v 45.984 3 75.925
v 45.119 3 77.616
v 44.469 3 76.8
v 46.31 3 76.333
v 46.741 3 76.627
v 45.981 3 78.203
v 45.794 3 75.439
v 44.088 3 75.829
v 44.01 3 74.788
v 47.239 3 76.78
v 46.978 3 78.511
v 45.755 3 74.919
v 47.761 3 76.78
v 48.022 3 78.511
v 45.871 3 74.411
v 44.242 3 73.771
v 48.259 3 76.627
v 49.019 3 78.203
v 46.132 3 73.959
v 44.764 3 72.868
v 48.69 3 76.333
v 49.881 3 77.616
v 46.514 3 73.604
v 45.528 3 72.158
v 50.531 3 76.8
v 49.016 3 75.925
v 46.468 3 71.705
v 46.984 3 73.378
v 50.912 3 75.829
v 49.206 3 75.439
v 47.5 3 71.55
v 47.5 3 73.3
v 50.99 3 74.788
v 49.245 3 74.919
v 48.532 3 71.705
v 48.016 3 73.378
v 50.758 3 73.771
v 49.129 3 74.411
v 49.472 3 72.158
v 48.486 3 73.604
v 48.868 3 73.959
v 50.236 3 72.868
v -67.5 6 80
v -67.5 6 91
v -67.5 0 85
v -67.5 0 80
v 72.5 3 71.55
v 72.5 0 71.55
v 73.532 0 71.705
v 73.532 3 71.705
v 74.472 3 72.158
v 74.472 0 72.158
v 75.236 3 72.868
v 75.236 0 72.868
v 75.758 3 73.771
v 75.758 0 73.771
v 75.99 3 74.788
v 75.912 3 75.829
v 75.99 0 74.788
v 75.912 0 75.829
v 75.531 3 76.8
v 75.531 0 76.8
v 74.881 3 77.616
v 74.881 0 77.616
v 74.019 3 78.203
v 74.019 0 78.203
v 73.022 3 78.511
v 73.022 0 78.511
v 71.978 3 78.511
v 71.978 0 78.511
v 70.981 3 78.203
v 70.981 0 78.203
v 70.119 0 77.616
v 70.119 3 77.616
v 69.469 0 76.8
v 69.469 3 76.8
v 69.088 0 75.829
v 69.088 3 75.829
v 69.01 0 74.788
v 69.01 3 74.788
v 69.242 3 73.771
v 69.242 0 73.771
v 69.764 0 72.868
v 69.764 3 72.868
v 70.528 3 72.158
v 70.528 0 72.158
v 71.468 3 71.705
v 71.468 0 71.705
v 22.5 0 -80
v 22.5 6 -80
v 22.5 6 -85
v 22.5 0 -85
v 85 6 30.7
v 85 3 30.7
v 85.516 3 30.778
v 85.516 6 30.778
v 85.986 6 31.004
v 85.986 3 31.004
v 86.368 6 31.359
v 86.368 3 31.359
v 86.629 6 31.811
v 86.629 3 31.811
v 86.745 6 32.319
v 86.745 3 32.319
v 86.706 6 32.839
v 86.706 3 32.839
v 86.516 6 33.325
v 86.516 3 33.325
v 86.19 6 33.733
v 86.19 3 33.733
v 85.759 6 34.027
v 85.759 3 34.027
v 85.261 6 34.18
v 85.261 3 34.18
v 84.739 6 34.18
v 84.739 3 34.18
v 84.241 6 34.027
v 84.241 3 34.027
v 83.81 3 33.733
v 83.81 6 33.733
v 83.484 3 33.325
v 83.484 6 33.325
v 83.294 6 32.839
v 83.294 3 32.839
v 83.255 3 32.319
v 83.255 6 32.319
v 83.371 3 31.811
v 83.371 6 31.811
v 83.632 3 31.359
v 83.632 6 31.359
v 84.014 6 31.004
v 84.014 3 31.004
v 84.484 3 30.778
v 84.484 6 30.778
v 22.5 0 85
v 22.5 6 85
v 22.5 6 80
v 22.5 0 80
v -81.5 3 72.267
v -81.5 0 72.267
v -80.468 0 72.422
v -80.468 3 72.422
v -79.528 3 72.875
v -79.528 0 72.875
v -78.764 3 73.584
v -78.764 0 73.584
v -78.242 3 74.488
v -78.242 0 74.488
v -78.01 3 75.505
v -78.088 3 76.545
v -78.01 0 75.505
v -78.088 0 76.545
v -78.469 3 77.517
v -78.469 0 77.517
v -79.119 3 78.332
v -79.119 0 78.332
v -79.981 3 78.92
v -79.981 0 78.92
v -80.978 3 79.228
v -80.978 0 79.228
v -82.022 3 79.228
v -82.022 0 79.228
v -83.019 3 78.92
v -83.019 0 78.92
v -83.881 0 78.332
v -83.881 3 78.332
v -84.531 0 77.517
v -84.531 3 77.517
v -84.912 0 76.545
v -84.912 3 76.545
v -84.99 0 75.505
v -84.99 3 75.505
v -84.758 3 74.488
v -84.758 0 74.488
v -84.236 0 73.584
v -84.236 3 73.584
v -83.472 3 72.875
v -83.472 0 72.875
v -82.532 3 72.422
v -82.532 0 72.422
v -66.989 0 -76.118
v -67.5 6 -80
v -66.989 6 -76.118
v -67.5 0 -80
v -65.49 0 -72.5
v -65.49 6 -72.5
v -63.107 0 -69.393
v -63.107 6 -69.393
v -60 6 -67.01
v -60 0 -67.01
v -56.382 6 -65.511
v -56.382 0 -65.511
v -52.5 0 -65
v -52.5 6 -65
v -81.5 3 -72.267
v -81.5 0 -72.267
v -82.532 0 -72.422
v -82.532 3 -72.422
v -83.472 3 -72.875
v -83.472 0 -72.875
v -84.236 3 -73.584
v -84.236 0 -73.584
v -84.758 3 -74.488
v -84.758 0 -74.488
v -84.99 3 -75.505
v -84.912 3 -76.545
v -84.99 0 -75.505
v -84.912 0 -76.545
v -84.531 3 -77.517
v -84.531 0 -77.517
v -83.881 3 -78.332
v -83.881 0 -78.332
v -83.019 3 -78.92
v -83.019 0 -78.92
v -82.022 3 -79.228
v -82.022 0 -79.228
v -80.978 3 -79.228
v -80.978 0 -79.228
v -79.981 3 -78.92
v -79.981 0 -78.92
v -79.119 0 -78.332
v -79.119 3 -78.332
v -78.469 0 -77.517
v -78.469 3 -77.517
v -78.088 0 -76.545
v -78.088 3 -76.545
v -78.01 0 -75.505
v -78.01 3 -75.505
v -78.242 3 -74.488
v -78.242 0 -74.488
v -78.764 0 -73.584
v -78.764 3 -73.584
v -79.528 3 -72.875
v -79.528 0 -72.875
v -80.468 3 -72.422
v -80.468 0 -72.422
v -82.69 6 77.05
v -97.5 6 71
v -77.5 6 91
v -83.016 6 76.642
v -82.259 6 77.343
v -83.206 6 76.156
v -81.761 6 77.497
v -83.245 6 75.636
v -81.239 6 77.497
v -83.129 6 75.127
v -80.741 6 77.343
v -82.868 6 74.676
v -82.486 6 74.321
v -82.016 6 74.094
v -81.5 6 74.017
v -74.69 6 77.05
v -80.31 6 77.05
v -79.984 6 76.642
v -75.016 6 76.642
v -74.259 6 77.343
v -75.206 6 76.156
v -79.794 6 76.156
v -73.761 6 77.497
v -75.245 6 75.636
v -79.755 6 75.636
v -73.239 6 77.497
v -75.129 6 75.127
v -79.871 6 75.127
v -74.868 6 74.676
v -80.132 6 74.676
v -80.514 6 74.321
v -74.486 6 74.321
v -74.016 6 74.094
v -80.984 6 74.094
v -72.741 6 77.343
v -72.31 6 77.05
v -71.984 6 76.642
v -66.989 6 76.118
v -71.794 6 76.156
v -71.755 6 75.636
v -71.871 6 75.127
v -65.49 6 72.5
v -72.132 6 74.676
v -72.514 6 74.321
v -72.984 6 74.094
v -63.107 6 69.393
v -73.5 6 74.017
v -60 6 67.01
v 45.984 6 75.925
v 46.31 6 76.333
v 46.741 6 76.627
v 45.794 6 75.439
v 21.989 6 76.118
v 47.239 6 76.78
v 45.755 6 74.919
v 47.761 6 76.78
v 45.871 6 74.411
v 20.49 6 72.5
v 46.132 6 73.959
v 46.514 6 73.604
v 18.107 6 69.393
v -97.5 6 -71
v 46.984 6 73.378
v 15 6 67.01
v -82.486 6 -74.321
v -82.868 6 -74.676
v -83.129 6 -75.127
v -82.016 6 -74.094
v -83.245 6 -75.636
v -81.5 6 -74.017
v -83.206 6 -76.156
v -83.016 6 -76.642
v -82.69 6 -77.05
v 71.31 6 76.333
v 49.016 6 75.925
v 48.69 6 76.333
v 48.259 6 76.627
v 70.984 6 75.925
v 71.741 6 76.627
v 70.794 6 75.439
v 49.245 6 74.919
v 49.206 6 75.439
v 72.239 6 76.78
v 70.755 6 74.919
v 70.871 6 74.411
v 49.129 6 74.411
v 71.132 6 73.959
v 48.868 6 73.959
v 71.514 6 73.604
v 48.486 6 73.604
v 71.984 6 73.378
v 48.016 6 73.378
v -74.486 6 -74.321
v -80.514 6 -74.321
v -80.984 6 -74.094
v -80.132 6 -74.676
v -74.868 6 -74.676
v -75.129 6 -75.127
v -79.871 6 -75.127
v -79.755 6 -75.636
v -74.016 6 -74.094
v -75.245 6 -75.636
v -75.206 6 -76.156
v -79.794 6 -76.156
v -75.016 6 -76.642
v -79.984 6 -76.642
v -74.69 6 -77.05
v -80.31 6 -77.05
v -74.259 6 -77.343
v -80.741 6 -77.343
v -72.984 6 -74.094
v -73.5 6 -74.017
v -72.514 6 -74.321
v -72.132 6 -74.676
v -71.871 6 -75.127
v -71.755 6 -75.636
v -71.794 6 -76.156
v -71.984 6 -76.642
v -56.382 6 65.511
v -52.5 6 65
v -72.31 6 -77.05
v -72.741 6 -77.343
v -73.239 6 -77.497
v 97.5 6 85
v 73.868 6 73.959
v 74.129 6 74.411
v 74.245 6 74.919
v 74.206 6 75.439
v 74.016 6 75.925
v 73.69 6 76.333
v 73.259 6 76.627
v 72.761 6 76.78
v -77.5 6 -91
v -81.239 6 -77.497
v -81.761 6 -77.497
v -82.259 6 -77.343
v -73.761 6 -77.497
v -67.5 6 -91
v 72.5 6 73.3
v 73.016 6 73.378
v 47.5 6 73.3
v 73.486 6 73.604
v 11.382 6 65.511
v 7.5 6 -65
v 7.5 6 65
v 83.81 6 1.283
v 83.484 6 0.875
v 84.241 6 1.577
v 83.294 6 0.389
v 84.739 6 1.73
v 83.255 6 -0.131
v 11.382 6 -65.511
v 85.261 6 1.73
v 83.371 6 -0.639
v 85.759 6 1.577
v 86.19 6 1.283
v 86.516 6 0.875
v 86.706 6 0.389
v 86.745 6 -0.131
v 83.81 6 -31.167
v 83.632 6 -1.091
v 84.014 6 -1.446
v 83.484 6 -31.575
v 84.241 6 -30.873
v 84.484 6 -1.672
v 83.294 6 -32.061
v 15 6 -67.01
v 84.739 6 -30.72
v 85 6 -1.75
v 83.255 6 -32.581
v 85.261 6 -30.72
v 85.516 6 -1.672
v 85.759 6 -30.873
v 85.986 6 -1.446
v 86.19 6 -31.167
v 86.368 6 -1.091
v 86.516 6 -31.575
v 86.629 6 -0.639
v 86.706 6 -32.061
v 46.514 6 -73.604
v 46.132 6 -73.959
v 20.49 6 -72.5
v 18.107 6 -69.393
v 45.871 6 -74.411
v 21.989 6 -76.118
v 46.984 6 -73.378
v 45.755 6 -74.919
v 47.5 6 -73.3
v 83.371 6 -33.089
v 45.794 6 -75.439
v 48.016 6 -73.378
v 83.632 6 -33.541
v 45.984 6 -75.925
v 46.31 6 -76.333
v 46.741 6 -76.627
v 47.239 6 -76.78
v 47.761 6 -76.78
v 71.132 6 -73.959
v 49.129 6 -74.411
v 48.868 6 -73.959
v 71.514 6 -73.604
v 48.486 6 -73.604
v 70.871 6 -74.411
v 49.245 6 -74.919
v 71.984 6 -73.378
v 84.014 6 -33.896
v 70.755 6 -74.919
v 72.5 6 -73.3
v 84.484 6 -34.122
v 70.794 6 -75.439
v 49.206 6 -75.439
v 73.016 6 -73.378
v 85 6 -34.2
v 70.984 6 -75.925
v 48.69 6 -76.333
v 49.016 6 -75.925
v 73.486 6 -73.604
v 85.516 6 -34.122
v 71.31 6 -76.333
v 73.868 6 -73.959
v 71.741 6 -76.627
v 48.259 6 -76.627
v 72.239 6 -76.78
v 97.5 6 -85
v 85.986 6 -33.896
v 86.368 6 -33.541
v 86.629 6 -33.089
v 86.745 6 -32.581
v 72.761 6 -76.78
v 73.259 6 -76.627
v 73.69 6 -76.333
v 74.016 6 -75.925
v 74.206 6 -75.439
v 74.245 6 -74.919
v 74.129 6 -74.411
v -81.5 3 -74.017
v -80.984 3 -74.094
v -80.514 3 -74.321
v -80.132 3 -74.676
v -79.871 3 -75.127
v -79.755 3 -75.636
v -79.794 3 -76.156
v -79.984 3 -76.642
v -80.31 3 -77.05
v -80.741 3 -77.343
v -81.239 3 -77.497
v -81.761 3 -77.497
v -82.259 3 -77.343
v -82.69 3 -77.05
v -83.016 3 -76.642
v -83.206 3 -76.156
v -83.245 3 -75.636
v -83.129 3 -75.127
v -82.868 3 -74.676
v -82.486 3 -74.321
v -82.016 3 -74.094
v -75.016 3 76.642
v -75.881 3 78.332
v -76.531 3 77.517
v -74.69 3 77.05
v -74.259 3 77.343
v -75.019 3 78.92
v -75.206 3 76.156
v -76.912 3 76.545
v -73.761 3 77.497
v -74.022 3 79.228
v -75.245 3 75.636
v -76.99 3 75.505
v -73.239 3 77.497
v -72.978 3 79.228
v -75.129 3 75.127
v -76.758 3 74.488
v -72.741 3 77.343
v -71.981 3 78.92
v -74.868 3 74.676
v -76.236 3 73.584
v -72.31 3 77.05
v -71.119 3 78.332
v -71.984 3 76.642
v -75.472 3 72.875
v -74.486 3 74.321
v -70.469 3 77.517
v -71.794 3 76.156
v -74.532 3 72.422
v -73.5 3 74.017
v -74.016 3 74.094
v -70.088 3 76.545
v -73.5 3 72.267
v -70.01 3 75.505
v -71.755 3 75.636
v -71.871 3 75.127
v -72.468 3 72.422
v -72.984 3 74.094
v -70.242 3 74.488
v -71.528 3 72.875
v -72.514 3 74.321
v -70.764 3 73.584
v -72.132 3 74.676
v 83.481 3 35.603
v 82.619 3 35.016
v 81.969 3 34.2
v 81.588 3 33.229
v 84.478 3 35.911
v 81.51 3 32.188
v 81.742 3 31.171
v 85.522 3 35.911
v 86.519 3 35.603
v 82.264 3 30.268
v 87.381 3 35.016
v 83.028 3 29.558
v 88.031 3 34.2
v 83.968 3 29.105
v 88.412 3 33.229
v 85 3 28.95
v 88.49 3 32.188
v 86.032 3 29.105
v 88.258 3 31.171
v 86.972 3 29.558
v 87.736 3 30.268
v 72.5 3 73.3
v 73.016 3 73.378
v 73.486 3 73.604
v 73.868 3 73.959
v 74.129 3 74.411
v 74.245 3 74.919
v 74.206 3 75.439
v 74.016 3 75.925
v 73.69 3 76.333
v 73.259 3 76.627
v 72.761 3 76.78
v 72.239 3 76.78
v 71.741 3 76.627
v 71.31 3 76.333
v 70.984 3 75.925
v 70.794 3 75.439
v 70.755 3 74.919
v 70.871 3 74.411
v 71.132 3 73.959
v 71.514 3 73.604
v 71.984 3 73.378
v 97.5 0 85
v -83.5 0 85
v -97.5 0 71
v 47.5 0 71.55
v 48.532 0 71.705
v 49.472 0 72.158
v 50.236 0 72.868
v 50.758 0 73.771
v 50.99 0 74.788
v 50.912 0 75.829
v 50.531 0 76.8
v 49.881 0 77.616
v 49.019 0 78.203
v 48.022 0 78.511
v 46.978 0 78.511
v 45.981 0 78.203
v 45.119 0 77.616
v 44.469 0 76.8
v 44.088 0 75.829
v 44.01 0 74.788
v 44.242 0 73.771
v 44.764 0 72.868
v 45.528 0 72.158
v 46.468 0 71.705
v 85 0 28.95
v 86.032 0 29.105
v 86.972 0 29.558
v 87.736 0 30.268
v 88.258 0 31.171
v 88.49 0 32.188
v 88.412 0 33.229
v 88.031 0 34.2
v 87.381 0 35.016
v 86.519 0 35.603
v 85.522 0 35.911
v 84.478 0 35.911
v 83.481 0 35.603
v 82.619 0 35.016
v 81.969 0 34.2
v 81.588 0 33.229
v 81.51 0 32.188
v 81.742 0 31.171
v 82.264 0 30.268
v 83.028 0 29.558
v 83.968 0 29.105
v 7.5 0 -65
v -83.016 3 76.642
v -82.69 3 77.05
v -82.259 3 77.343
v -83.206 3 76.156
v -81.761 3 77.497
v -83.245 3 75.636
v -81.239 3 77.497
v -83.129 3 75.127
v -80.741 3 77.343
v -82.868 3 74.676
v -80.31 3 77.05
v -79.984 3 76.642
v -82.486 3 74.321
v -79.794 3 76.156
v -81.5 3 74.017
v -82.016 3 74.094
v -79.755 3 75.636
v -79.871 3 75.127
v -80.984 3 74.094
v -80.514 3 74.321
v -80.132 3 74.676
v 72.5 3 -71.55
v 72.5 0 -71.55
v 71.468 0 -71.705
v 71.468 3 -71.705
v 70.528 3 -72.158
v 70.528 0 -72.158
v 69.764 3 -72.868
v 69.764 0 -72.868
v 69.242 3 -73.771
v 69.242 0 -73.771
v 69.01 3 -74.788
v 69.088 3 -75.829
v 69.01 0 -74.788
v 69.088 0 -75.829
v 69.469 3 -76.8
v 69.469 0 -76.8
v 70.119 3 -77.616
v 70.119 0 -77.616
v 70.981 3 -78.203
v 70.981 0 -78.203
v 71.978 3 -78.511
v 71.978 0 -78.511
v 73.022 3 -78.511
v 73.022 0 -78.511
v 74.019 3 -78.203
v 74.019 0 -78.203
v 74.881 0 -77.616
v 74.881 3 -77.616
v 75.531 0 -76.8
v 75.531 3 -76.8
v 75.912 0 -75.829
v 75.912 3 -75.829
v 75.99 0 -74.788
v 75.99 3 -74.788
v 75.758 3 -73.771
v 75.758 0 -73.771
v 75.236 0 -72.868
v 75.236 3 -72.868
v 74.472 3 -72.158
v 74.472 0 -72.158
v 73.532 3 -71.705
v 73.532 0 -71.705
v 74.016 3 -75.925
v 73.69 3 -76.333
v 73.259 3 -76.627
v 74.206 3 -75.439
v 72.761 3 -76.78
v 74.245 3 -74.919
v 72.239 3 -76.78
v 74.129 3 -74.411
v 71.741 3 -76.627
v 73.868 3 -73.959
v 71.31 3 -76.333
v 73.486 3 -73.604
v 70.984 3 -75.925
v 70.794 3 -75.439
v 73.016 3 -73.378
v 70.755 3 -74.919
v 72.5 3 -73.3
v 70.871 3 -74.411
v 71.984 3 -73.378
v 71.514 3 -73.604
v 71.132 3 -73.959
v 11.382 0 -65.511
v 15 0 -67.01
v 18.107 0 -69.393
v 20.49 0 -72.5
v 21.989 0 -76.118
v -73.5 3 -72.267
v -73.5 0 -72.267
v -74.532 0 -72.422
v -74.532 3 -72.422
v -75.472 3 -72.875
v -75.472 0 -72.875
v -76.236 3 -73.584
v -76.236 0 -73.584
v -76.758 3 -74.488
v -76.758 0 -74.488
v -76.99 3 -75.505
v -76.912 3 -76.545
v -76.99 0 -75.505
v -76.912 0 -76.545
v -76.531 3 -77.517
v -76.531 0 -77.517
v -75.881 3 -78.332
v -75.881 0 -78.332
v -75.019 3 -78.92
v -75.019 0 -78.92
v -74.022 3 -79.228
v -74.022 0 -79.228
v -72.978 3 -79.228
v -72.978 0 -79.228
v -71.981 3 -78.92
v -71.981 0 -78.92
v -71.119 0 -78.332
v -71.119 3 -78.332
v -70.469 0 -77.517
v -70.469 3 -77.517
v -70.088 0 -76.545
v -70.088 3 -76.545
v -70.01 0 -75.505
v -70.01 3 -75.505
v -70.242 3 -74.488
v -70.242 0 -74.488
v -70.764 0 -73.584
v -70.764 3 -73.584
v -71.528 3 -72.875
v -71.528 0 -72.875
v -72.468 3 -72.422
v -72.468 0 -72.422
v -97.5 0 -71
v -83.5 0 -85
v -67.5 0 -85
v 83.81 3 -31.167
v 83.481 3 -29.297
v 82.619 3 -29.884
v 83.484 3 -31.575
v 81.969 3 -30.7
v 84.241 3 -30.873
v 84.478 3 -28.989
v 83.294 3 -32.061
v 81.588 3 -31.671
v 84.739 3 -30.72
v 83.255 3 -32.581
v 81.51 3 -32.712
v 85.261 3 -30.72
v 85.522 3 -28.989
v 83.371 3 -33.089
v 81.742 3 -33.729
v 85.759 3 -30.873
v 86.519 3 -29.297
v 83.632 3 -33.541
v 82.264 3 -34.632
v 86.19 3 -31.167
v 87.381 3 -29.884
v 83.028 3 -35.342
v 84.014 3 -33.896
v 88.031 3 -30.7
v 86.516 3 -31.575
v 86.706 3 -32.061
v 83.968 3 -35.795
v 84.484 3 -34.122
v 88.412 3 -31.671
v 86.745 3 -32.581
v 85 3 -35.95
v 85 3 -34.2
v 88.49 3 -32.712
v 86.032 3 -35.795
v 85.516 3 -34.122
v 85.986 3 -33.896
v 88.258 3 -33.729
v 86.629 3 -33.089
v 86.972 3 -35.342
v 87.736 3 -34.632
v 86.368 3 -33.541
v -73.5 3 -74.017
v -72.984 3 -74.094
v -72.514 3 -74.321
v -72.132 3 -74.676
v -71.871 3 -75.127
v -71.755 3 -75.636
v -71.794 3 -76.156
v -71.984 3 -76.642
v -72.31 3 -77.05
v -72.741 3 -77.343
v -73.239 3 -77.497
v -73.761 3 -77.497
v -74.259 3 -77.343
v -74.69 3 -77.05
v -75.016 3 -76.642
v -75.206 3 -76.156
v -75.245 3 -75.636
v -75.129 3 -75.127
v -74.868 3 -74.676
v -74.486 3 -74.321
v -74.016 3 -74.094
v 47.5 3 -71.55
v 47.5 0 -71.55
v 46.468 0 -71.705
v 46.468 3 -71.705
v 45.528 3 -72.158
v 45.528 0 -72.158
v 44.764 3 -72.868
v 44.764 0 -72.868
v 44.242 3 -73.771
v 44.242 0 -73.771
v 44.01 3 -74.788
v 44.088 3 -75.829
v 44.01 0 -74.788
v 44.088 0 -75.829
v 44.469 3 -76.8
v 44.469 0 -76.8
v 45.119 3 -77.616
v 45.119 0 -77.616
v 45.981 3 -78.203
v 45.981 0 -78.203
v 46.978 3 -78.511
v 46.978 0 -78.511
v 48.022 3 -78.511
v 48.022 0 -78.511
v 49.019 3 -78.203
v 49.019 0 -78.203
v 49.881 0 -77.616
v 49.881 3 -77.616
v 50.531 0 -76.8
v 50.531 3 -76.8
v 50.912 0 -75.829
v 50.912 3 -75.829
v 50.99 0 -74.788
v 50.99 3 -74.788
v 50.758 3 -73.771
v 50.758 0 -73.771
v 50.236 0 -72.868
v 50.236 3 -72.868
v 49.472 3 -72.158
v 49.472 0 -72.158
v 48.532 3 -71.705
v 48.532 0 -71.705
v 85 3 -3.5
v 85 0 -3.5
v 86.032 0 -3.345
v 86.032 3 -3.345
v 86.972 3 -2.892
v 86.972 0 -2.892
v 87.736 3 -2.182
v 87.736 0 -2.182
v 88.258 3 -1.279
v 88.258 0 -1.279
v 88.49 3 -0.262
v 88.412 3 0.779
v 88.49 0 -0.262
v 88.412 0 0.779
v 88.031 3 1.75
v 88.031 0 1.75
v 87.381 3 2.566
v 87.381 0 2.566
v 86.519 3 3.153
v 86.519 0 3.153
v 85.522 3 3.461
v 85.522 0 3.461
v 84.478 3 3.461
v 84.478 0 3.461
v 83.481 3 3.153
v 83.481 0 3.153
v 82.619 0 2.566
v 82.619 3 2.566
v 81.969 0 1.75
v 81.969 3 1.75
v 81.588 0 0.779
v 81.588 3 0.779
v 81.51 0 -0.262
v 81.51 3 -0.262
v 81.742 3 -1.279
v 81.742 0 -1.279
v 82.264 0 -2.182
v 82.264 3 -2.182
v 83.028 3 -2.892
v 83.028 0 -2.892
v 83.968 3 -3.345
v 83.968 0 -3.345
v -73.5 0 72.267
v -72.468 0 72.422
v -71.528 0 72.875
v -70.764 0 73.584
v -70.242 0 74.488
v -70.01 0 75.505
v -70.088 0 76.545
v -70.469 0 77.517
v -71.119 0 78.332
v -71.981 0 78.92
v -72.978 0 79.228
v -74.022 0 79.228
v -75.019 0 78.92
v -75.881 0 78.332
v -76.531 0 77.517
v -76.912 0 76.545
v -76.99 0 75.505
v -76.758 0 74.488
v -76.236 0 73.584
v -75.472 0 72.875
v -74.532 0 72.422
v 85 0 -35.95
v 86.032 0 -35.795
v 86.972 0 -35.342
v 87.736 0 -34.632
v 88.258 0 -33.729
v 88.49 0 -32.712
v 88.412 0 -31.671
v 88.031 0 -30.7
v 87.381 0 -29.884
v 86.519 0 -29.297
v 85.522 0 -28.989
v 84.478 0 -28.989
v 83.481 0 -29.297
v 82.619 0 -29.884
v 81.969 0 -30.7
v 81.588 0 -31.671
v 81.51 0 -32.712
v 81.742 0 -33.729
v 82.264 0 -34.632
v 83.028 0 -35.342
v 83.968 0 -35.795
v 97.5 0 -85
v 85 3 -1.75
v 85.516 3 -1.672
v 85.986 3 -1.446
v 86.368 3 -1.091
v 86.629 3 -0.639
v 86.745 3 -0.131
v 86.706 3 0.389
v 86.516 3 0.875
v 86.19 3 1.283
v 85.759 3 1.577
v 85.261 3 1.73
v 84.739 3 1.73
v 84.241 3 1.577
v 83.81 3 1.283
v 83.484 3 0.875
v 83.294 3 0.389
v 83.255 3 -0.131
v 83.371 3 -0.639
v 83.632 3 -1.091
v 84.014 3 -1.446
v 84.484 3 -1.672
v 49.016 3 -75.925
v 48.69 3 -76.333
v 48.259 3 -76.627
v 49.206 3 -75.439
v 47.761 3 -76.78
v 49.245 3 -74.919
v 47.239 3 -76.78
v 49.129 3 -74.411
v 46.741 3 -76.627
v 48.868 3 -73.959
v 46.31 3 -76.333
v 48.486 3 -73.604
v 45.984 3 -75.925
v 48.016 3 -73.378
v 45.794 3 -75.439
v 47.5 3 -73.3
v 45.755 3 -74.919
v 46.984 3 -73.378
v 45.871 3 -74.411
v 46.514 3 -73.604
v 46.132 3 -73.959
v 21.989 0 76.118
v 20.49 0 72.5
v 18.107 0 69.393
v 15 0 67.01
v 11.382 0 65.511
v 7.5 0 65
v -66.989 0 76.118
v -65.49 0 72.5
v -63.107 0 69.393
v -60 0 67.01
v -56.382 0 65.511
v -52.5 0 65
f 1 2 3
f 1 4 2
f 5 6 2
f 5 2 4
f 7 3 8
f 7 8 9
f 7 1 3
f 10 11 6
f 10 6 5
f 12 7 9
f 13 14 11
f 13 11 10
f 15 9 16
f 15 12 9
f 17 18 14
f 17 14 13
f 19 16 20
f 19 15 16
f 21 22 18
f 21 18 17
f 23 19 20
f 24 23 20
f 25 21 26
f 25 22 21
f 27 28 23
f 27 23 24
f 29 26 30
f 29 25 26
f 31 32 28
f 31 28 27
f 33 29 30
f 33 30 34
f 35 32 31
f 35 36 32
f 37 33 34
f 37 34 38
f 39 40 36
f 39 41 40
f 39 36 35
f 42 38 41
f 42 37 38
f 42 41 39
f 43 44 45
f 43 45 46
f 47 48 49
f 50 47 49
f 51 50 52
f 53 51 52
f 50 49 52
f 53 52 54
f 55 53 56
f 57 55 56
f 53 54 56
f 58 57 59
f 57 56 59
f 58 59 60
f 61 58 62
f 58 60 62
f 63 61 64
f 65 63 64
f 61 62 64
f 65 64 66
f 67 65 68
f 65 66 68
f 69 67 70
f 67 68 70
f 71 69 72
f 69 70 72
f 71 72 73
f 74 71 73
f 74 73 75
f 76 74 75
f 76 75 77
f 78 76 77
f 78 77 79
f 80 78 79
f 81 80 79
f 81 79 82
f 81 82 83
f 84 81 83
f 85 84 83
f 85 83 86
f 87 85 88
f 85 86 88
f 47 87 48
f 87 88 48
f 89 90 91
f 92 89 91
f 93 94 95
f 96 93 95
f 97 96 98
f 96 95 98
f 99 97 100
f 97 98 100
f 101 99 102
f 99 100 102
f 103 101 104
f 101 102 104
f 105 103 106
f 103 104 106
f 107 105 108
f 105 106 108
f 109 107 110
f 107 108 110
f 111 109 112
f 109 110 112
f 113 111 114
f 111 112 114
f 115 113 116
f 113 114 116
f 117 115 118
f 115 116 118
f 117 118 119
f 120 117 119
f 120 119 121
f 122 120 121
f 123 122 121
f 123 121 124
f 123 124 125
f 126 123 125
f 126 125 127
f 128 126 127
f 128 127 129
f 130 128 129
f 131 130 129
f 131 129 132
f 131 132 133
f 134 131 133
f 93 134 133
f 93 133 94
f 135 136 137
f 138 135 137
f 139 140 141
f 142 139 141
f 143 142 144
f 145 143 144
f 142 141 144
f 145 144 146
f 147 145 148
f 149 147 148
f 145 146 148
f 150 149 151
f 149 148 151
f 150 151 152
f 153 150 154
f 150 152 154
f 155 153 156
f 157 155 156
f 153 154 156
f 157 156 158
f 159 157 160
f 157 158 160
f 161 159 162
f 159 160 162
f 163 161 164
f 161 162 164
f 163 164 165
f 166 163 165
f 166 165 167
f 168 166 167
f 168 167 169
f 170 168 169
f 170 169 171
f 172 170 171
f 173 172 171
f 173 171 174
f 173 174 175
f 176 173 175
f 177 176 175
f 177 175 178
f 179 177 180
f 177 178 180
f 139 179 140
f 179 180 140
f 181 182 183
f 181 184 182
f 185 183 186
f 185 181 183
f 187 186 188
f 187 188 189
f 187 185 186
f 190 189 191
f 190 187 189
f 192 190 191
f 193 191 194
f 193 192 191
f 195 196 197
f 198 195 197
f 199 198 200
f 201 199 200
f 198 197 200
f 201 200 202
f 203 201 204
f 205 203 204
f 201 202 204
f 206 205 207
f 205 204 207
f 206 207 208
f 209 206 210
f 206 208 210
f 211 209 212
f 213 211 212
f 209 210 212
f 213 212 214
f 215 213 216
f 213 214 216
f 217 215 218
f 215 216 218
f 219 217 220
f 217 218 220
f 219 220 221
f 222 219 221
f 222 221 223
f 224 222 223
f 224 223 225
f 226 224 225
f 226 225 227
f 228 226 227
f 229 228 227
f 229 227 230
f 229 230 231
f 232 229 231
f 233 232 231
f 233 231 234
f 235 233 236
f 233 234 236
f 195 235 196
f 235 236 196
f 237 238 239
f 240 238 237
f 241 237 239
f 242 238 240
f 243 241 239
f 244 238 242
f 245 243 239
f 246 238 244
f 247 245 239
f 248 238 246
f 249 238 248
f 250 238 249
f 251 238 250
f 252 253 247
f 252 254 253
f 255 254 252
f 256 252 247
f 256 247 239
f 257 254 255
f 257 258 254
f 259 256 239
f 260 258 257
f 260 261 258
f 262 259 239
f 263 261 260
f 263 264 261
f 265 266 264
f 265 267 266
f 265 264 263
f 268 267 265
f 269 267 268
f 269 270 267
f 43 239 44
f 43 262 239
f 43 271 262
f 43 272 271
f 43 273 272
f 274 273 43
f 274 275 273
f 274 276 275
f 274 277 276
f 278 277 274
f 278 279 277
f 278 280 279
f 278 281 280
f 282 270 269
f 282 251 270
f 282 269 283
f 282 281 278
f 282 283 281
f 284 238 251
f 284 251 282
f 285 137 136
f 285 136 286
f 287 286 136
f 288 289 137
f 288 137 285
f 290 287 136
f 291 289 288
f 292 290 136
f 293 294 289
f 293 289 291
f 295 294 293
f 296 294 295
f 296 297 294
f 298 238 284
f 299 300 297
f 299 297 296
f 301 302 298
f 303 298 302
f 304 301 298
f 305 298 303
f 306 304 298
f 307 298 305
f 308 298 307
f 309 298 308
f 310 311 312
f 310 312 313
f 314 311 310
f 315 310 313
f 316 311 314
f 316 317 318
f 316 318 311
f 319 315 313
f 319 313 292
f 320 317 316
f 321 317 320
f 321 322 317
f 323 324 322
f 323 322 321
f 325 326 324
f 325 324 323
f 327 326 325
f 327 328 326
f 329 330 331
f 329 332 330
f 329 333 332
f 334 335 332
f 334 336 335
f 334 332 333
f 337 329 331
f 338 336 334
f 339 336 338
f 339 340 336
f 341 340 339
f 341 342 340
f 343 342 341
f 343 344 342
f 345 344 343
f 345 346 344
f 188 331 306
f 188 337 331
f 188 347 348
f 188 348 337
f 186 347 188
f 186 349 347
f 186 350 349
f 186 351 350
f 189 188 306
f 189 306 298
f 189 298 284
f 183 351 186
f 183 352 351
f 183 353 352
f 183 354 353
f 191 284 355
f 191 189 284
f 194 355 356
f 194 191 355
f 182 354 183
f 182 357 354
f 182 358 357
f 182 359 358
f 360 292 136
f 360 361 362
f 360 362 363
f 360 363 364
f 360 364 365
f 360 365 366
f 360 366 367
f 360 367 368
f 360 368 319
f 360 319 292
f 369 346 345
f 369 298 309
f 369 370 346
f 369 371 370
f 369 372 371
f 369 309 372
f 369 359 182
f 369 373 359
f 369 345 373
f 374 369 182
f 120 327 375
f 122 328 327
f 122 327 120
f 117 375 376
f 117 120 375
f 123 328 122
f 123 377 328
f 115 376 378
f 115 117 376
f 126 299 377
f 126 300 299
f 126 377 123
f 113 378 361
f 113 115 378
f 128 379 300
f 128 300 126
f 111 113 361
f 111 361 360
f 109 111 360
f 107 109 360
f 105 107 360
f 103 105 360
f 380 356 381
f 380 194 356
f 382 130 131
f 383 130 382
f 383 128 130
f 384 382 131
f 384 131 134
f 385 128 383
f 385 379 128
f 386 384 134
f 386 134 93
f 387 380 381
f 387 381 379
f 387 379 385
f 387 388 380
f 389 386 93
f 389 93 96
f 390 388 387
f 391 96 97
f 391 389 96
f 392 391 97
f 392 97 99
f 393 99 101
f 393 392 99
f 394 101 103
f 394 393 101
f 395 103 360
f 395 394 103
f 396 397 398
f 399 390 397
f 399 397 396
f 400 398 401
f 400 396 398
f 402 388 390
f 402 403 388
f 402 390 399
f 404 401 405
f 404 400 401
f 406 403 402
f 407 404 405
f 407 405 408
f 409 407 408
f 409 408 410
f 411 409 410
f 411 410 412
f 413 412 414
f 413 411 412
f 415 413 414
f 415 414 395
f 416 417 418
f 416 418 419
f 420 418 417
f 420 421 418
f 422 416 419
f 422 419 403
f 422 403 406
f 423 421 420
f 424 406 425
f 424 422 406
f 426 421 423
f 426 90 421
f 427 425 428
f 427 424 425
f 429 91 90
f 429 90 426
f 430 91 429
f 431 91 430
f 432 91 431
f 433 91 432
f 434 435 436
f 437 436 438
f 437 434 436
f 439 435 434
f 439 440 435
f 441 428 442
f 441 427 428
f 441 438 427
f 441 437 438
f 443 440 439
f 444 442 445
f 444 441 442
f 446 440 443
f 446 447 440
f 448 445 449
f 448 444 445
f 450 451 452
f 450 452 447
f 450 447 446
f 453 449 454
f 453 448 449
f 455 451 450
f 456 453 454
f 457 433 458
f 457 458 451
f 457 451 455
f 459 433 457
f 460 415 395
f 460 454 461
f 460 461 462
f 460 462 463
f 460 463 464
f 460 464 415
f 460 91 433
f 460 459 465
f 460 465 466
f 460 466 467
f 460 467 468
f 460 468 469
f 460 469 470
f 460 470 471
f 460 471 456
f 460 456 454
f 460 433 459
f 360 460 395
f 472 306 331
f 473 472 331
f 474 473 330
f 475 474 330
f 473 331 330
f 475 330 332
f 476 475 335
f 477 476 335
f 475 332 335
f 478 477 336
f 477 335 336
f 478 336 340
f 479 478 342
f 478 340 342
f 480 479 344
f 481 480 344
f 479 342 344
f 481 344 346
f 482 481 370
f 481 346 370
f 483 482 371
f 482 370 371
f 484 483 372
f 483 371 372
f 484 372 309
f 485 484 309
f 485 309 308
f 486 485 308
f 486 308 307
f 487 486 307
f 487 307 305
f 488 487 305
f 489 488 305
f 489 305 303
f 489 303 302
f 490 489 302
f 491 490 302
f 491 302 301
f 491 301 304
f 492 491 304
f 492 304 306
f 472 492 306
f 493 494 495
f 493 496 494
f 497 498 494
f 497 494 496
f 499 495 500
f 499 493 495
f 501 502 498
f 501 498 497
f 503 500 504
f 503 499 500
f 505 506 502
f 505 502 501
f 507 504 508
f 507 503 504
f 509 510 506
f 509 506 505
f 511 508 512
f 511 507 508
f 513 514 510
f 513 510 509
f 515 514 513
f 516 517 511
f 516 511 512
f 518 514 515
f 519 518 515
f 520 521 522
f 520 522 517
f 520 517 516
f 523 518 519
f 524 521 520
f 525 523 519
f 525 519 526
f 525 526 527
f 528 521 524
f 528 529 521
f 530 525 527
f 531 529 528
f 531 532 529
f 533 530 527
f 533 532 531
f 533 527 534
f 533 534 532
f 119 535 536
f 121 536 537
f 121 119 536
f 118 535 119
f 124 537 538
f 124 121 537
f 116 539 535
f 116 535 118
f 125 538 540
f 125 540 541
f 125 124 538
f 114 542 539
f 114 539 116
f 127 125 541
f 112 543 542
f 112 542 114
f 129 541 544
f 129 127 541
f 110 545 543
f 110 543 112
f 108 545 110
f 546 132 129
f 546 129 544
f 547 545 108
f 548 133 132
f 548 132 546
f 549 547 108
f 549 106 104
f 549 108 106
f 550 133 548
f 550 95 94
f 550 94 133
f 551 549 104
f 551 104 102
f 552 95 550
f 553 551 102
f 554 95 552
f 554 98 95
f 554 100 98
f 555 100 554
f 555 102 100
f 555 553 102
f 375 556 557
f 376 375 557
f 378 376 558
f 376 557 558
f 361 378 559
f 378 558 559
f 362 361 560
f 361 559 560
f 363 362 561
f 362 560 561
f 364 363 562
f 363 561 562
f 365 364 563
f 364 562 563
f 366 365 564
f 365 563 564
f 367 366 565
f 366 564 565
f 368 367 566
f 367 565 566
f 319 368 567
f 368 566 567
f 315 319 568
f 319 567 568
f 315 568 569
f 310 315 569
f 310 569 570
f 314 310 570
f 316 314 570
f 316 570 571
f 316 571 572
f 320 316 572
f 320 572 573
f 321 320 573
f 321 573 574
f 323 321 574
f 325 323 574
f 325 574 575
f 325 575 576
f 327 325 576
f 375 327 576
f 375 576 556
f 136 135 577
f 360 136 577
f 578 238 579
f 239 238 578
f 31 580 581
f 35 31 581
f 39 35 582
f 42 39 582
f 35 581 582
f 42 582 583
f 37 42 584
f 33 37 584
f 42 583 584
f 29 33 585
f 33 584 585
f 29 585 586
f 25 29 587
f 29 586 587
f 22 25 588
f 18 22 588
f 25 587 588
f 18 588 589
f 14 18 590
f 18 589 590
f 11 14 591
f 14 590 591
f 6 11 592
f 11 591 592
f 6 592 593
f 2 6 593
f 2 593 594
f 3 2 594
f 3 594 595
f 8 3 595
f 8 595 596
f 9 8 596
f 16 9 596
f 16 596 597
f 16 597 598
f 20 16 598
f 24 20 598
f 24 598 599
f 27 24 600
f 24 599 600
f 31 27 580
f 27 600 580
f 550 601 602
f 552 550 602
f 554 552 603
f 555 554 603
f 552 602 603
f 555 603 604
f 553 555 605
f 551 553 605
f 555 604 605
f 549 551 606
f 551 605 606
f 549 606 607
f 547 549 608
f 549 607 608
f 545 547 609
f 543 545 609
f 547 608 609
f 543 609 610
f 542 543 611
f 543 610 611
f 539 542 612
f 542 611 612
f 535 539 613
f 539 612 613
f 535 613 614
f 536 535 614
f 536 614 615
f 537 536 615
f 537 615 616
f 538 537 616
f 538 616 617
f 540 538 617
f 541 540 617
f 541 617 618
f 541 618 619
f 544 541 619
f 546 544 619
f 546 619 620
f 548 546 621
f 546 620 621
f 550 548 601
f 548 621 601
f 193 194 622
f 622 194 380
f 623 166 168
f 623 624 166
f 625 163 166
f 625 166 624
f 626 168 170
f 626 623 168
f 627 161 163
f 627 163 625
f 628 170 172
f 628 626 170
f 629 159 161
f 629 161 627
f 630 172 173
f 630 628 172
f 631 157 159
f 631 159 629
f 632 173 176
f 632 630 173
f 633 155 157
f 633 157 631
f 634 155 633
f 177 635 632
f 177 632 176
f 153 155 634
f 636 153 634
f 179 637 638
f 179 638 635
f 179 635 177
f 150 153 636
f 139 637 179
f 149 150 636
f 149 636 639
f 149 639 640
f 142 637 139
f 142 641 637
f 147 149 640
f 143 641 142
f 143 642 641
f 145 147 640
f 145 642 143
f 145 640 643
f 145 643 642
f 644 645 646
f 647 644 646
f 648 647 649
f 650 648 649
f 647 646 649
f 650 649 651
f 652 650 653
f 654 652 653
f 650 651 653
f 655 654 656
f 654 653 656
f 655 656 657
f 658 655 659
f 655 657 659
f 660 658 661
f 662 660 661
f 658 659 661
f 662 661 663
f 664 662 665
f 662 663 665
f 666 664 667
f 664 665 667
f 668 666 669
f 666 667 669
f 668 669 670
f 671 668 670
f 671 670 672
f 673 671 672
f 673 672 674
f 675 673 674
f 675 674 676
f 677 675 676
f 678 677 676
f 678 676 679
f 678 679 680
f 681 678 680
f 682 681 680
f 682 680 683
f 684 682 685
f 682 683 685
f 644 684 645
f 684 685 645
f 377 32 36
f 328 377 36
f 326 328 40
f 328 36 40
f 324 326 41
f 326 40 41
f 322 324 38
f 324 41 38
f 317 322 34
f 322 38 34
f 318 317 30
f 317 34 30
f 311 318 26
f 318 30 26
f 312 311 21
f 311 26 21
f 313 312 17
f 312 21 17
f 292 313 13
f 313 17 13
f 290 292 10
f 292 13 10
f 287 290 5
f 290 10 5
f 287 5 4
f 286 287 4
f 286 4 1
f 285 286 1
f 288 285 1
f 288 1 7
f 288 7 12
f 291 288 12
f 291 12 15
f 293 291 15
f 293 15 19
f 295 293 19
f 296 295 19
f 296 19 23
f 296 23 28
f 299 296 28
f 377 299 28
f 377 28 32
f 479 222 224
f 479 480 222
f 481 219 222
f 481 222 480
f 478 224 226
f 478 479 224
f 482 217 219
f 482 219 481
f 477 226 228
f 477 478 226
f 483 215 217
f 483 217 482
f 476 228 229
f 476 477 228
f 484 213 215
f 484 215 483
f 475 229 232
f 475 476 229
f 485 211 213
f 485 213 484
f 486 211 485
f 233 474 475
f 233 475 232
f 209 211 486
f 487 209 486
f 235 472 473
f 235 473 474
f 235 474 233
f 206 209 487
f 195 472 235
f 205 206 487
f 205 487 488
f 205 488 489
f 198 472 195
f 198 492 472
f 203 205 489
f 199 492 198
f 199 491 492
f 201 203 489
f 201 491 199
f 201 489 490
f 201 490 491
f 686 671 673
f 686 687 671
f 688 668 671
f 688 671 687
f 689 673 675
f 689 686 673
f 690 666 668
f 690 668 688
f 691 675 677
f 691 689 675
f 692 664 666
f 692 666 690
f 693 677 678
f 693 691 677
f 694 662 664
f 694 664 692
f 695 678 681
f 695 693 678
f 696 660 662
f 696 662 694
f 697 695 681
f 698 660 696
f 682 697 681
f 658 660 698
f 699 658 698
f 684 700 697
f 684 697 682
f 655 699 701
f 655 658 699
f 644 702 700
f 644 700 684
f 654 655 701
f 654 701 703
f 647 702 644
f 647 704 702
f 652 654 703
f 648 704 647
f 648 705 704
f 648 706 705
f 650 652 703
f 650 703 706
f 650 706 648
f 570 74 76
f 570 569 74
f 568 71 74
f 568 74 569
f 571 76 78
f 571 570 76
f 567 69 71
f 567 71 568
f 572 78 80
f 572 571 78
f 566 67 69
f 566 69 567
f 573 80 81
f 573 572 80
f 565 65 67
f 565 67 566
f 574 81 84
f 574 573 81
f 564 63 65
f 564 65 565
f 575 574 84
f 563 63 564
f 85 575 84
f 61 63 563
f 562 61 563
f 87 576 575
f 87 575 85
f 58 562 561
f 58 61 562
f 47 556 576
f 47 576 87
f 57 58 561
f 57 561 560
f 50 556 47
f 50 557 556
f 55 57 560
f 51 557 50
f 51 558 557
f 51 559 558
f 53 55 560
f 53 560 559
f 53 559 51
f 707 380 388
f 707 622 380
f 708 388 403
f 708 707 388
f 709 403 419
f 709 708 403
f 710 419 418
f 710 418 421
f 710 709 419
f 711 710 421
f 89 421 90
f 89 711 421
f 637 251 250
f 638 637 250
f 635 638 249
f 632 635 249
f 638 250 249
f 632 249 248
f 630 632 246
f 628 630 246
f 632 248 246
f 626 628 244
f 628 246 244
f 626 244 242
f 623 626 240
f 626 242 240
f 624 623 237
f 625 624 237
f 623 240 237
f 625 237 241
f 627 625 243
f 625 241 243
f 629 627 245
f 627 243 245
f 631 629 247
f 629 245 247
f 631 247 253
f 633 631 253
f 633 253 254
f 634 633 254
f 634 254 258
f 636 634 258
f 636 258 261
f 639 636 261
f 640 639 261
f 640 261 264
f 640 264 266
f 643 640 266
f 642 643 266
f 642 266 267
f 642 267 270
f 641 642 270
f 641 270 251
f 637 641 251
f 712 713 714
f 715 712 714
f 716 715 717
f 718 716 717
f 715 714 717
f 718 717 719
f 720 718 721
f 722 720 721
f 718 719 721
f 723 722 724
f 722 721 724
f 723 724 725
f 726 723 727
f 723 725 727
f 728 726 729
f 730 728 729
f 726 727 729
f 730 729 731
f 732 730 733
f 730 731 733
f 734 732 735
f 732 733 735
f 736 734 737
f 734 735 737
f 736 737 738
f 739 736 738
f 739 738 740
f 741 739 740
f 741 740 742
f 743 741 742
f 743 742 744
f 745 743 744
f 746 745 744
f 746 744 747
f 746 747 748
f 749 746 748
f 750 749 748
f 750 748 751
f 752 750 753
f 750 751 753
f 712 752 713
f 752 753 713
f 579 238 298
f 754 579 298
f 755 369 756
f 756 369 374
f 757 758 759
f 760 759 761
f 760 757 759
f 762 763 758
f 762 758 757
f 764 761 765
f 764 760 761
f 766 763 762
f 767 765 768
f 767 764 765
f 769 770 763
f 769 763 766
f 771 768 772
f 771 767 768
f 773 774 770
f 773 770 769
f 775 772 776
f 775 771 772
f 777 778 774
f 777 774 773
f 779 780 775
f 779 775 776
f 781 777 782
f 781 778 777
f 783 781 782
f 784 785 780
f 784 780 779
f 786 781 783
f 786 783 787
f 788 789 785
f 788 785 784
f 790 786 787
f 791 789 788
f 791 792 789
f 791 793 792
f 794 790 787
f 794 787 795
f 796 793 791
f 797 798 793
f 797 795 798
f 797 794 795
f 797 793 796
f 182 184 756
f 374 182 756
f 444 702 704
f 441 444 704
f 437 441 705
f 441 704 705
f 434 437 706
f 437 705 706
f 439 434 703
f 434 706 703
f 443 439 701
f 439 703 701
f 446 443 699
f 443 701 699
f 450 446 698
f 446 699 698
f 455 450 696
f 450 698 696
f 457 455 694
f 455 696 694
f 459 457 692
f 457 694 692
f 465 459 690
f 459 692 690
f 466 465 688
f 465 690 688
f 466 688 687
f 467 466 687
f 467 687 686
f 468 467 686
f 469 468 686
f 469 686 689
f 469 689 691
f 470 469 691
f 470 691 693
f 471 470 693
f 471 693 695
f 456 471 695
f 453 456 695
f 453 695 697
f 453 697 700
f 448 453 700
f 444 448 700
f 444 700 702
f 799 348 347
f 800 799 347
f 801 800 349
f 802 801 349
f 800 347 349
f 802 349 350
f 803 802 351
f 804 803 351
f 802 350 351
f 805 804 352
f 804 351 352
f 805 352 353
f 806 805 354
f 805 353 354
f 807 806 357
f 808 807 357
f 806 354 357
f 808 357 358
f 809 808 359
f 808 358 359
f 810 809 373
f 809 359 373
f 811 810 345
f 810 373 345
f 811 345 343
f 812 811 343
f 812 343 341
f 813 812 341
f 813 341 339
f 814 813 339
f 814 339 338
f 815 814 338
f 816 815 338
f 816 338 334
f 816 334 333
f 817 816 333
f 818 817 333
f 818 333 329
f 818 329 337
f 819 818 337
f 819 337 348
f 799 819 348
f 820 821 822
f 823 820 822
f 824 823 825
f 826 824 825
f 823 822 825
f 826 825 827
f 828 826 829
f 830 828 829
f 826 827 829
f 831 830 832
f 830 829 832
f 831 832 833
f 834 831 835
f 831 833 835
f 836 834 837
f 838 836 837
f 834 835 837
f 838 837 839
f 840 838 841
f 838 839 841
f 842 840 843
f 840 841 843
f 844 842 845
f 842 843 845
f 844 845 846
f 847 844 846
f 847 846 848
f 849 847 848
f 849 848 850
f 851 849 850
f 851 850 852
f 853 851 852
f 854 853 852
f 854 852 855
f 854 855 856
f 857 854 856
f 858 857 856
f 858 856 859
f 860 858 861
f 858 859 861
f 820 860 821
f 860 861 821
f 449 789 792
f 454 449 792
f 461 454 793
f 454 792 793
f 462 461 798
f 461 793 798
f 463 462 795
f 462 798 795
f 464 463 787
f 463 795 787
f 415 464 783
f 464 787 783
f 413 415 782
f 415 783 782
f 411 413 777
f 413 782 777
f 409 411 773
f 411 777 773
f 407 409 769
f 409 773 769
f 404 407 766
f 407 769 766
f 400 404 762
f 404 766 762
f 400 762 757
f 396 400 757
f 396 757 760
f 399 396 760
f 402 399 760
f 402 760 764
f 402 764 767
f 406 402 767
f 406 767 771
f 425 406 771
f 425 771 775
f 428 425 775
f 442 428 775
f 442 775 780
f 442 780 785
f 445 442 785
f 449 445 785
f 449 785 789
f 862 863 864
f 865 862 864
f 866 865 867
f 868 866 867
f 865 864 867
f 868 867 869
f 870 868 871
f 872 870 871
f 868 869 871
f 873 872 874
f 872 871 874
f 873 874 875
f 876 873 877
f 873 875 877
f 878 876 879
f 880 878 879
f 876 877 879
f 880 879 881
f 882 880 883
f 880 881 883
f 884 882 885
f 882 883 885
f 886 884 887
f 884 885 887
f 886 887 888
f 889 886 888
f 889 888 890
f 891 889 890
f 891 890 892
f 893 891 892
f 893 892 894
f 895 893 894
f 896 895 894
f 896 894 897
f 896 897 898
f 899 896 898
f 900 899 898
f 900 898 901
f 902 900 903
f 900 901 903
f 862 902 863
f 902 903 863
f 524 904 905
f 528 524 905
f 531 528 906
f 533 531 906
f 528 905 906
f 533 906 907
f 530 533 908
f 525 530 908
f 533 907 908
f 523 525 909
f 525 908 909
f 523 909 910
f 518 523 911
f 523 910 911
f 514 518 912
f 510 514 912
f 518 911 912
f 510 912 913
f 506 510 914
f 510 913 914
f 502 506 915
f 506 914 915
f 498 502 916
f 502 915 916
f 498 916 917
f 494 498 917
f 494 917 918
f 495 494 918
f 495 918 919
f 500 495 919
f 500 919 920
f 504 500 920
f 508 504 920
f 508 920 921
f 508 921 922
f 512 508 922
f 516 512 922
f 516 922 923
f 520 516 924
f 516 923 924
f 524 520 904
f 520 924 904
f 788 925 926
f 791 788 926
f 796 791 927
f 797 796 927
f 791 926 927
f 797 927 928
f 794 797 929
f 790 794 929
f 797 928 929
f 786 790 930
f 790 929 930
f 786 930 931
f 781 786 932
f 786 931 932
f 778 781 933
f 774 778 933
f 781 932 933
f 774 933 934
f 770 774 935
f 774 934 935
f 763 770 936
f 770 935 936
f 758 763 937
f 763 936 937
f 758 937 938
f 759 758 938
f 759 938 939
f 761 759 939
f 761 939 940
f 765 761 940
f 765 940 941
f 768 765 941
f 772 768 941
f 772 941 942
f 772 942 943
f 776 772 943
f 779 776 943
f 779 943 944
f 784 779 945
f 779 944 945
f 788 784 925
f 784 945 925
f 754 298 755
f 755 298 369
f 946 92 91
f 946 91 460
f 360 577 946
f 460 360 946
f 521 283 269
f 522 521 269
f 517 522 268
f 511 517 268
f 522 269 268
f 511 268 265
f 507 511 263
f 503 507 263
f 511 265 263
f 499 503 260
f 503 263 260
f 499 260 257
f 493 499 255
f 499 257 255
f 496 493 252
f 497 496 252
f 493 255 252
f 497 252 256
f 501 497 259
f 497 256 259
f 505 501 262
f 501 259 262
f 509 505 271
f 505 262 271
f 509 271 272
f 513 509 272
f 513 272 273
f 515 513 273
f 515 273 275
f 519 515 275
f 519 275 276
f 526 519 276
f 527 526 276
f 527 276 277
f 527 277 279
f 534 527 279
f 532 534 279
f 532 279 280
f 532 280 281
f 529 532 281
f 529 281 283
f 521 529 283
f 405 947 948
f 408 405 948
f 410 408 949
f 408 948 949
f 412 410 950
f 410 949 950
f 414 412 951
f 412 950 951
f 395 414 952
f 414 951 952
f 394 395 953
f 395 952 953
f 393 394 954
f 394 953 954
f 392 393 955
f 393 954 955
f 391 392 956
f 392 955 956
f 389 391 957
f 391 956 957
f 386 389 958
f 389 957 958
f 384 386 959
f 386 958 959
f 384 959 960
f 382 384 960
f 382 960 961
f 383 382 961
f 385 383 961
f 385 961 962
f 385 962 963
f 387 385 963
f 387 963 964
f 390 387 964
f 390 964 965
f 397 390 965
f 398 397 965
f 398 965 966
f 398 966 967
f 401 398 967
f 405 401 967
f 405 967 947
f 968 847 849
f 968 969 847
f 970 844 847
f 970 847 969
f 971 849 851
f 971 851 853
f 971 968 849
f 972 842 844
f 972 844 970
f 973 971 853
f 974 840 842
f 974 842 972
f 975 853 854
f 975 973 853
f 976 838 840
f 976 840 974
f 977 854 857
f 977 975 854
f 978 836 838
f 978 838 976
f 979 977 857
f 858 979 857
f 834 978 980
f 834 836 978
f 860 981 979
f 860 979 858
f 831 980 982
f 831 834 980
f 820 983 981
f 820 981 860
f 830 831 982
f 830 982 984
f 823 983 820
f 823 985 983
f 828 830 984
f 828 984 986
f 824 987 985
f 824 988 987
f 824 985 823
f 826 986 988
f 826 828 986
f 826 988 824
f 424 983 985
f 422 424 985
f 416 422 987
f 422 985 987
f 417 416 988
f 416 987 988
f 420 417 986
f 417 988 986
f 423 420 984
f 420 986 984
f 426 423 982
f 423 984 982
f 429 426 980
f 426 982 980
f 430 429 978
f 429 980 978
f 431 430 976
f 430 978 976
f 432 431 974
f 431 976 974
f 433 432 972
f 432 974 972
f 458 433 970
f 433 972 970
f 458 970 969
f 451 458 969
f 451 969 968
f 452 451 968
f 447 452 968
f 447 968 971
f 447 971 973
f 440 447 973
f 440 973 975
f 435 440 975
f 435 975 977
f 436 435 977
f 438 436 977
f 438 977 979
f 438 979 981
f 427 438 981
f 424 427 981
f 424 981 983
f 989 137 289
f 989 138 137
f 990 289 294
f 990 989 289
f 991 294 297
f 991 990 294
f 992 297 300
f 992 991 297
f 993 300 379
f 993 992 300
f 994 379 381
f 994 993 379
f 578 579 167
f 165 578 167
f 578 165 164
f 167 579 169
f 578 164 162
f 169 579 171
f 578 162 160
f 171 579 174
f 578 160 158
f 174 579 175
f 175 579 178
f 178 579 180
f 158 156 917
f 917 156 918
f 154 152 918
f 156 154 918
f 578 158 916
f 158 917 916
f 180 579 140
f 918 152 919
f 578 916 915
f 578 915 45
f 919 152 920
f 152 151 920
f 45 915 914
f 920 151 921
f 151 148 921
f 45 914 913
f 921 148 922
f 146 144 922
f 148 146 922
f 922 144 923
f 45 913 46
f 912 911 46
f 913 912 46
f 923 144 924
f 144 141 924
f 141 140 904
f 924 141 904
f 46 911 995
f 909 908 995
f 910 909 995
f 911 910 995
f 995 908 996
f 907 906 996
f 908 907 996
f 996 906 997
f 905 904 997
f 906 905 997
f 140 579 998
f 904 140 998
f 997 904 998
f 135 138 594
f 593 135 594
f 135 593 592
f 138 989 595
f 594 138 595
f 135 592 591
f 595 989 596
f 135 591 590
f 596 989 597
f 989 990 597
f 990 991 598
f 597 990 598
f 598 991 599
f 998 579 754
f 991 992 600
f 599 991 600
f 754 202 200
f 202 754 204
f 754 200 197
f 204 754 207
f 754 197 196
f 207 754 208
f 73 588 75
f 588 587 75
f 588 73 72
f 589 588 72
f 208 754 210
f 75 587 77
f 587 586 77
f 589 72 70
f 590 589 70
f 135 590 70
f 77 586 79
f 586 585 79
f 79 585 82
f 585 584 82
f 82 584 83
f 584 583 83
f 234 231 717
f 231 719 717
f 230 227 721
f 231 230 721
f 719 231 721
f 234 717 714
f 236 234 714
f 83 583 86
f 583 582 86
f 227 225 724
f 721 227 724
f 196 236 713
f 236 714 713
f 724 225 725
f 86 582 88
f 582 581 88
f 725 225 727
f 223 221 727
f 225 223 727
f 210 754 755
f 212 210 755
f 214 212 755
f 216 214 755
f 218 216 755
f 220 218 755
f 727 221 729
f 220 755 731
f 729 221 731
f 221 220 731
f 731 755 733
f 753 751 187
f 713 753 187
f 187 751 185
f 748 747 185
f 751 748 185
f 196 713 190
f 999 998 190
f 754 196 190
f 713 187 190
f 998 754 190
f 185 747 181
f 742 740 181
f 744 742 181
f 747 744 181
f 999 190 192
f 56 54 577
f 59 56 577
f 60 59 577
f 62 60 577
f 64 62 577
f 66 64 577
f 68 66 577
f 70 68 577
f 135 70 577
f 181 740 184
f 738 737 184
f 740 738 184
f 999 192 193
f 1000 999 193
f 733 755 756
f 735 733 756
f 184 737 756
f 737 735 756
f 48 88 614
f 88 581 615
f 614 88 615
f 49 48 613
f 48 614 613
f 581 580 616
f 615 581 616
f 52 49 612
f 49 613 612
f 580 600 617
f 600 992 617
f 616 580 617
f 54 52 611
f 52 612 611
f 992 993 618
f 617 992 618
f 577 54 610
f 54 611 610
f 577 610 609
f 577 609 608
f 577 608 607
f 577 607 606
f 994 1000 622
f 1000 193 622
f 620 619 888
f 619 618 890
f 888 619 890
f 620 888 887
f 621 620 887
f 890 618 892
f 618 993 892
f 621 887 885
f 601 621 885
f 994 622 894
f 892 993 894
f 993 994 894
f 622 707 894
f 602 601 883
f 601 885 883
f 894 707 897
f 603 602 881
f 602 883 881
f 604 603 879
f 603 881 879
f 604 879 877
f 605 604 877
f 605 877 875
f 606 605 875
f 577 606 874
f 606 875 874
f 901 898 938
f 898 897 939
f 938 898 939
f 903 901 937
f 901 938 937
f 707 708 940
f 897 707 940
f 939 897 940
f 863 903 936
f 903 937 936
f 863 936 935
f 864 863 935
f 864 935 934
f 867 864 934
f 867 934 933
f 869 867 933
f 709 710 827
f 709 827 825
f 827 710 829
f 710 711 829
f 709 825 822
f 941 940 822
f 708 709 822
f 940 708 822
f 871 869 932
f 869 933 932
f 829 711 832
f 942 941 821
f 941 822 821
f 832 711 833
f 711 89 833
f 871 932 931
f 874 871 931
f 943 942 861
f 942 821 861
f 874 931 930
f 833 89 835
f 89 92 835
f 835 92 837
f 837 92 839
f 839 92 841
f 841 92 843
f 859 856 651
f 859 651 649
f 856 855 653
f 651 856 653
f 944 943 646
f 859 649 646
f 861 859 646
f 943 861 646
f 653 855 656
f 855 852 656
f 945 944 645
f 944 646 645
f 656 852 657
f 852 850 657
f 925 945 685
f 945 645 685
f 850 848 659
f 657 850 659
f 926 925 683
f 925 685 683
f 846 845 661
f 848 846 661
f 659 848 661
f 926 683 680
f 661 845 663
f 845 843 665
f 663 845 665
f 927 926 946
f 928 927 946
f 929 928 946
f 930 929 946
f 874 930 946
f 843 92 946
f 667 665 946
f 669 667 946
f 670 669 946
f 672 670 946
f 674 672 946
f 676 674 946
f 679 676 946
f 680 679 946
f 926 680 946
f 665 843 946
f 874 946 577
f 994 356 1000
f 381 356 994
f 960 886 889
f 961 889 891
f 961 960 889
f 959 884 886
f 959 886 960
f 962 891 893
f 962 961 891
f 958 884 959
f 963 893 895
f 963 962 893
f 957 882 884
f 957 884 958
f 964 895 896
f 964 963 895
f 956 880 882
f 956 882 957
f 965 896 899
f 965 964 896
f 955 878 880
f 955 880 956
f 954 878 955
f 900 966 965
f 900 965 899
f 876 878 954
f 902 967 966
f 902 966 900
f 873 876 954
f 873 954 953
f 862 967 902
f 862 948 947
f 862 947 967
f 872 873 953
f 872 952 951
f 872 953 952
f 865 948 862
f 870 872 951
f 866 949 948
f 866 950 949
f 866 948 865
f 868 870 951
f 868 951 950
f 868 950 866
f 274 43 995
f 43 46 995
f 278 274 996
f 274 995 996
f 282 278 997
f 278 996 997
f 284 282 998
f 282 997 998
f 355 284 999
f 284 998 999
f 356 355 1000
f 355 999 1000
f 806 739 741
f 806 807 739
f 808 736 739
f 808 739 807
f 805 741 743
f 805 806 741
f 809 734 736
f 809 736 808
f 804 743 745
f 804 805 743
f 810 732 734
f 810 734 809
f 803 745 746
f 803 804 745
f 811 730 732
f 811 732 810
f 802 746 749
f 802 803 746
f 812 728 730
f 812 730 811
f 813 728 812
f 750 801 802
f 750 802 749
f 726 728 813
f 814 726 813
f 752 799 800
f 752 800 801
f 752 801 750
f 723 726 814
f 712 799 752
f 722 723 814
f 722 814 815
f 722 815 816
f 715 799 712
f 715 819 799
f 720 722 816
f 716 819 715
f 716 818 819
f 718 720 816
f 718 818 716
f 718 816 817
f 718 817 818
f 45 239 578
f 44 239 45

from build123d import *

# Parameters (mm, degrees)
SKETCH1_W           = 195
SKETCH1_H           = 170
BOSS_EXTRUDE1_DEPTH = 6
SKETCH2_W           = 90
SKETCH2_H           = 20
CUT_EXTRUDE1_DEPTH  = 130.48841647
FILLET1_R           = 15
SKETCH3_W           = 30
SKETCH3_H           = 6
BOSS_EXTRUDE2_DEPTH = 6
CHAMFER1_SIZE       = 20
SKETCH4_R           = 1.75
CUT_EXTRUDE2_DEPTH  = 134.503745266
SKETCH7_R           = 1.75
CUT_EXTRUDE5_DEPTH  = 134.503745266
SKETCH8_R           = 1.75
CUT_EXTRUDE6_DEPTH  = 134.503745266
SKETCH6_R           = 3.5
CUT_EXTRUDE4_DEPTH  = 3
CHAMFER3_SIZE       = 6


with BuildPart() as part:
    # Sketch1 → Boss-Extrude1 (new body)
    with BuildSketch(Plane(origin=(0, 0, 0), x_dir=(1, 0, 0), z_dir=(0, 1, 0))):
        Rectangle(SKETCH1_W, SKETCH1_H)
    extrude(amount=BOSS_EXTRUDE1_DEPTH)

    # Sketch2 → Cut-Extrude1 (cut, through all)
    with BuildSketch(Plane(origin=(0, 6, 0), x_dir=(1, 0, 0), z_dir=(0, 1, 0))):
        with Locations((-22.5, -75)):
            Rectangle(SKETCH2_W, SKETCH2_H)
        with Locations((-22.5, 75)):
            Rectangle(SKETCH2_W, SKETCH2_H)
    extrude(amount=-CUT_EXTRUDE1_DEPTH, mode=Mode.SUBTRACT)

    # Fillet1
    fillet1_edges = [part.edges().sort_by_distance(p)[0] for p in [
        (-67.5, 3, 65),
        (22.5, 3, 65),
        (-67.5, 3, -65),
        (22.5, 3, -65),
    ]]
    fillet(fillet1_edges, radius=FILLET1_R)

    # Sketch3 → Boss-Extrude2 (add)
    with BuildSketch(Plane(origin=(0, 6, 0), x_dir=(1, 0, 0), z_dir=(0, 1, 0))):
        with Locations((-82.5, 88)):
            Rectangle(SKETCH3_W, SKETCH3_H)
        with Locations((-82.5, -88)):
            Rectangle(SKETCH3_W, SKETCH3_H)
    extrude(amount=-BOSS_EXTRUDE2_DEPTH)

    # Chamfer1
    chamfer1_edges = [part.edges().sort_by_distance(p)[0] for p in [
        (-97.5, 3, -91),
        (-97.5, 3, 91),
    ]]
    chamfer(chamfer1_edges, length=CHAMFER1_SIZE)

    # Sketch4 → Cut-Extrude2 (cut, through all)
    with BuildSketch(Plane(origin=(0, 6, 0), x_dir=(1, 0, 0), z_dir=(0, 1, 0))):
        with Locations(Location((-81.5, 75.766666667, 0), (0, 0, 270))):
            Circle(SKETCH4_R)
        with Locations(Location((-81.5, -75.766666667, 0), (0, 0, 90))):
            Circle(SKETCH4_R)
        with Locations(Location((-73.5, 75.766666667, 0), (0, 0, 270))):
            Circle(SKETCH4_R)
        with Locations(Location((-73.5, -75.766666667, 0), (0, 0, 90))):
            Circle(SKETCH4_R)
    extrude(amount=-CUT_EXTRUDE2_DEPTH, mode=Mode.SUBTRACT)

    # Sketch7 → Cut-Extrude5 (cut, through all)
    with BuildSketch(Plane.XZ):
        with Locations(Location((47.5, 75.05, 0), (0, 0, 270))):
            Circle(SKETCH7_R)
        with Locations(Location((72.5, 75.05, 0), (0, 0, 270))):
            Circle(SKETCH7_R)
        with Locations(Location((72.5, -75.05, 0), (0, 0, 90))):
            Circle(SKETCH7_R)
        with Locations(Location((47.5, -75.05, 0), (0, 0, 90))):
            Circle(SKETCH7_R)
    extrude(amount=-CUT_EXTRUDE5_DEPTH, mode=Mode.SUBTRACT)

    # Sketch8 → Cut-Extrude6 (cut, through all)
    with BuildSketch(Plane.XZ):
        with Locations(Location((85, 32.45, 0), (0, 0, 270))):
            Circle(SKETCH8_R)
        with Locations(Location((85, 0, 0), (0, 0, 270))):
            Circle(SKETCH8_R)
        with Locations(Location((85, -32.45, 0), (0, 0, 270))):
            Circle(SKETCH8_R)
    extrude(amount=-CUT_EXTRUDE6_DEPTH, mode=Mode.SUBTRACT)

    # Sketch6 → Cut-Extrude4 (cut)
    with BuildSketch(Plane.XZ):
        with Locations(Location((-73.5, 75.766666667, 0), (0, 0, 270))):
            Circle(SKETCH6_R)
        with Locations(Location((-81.5, 75.766666667, 0), (0, 0, 270))):
            Circle(SKETCH6_R)
        with Locations(Location((-73.5, -75.766666667, 0), (0, 0, 90))):
            Circle(SKETCH6_R)
        with Locations(Location((-81.5, -75.766666667, 0), (0, 0, 90))):
            Circle(SKETCH6_R)
        with Locations(Location((47.5, 75.05, 0), (0, 0, 270))):
            Circle(SKETCH6_R)
        with Locations(Location((72.5, 75.05, 0), (0, 0, 270))):
            Circle(SKETCH6_R)
        with Locations(Location((47.5, -75.05, 0), (0, 0, 90))):
            Circle(SKETCH6_R)
        with Locations(Location((72.5, -75.05, 0), (0, 0, 90))):
            Circle(SKETCH6_R)
        with Locations(Location((85, 32.45, 0), (0, 0, 270))):
            Circle(SKETCH6_R)
        with Locations(Location((85, 0, 0), (0, 0, 270))):
            Circle(SKETCH6_R)
        with Locations(Location((85, -32.45, 0), (0, 0, 270))):
            Circle(SKETCH6_R)
    extrude(amount=-CUT_EXTRUDE4_DEPTH, mode=Mode.SUBTRACT)

    # Chamfer3
    chamfer3_edges = [part.edges().sort_by_distance(p)[0] for p in [
        (-72.5, 0, -91),
        (-72.5, 0, 91),
    ]]
    chamfer(chamfer3_edges, length=CHAMFER3_SIZE - 0.0001)  # a hair under: the kernel refuses the full size


solid = part.part
